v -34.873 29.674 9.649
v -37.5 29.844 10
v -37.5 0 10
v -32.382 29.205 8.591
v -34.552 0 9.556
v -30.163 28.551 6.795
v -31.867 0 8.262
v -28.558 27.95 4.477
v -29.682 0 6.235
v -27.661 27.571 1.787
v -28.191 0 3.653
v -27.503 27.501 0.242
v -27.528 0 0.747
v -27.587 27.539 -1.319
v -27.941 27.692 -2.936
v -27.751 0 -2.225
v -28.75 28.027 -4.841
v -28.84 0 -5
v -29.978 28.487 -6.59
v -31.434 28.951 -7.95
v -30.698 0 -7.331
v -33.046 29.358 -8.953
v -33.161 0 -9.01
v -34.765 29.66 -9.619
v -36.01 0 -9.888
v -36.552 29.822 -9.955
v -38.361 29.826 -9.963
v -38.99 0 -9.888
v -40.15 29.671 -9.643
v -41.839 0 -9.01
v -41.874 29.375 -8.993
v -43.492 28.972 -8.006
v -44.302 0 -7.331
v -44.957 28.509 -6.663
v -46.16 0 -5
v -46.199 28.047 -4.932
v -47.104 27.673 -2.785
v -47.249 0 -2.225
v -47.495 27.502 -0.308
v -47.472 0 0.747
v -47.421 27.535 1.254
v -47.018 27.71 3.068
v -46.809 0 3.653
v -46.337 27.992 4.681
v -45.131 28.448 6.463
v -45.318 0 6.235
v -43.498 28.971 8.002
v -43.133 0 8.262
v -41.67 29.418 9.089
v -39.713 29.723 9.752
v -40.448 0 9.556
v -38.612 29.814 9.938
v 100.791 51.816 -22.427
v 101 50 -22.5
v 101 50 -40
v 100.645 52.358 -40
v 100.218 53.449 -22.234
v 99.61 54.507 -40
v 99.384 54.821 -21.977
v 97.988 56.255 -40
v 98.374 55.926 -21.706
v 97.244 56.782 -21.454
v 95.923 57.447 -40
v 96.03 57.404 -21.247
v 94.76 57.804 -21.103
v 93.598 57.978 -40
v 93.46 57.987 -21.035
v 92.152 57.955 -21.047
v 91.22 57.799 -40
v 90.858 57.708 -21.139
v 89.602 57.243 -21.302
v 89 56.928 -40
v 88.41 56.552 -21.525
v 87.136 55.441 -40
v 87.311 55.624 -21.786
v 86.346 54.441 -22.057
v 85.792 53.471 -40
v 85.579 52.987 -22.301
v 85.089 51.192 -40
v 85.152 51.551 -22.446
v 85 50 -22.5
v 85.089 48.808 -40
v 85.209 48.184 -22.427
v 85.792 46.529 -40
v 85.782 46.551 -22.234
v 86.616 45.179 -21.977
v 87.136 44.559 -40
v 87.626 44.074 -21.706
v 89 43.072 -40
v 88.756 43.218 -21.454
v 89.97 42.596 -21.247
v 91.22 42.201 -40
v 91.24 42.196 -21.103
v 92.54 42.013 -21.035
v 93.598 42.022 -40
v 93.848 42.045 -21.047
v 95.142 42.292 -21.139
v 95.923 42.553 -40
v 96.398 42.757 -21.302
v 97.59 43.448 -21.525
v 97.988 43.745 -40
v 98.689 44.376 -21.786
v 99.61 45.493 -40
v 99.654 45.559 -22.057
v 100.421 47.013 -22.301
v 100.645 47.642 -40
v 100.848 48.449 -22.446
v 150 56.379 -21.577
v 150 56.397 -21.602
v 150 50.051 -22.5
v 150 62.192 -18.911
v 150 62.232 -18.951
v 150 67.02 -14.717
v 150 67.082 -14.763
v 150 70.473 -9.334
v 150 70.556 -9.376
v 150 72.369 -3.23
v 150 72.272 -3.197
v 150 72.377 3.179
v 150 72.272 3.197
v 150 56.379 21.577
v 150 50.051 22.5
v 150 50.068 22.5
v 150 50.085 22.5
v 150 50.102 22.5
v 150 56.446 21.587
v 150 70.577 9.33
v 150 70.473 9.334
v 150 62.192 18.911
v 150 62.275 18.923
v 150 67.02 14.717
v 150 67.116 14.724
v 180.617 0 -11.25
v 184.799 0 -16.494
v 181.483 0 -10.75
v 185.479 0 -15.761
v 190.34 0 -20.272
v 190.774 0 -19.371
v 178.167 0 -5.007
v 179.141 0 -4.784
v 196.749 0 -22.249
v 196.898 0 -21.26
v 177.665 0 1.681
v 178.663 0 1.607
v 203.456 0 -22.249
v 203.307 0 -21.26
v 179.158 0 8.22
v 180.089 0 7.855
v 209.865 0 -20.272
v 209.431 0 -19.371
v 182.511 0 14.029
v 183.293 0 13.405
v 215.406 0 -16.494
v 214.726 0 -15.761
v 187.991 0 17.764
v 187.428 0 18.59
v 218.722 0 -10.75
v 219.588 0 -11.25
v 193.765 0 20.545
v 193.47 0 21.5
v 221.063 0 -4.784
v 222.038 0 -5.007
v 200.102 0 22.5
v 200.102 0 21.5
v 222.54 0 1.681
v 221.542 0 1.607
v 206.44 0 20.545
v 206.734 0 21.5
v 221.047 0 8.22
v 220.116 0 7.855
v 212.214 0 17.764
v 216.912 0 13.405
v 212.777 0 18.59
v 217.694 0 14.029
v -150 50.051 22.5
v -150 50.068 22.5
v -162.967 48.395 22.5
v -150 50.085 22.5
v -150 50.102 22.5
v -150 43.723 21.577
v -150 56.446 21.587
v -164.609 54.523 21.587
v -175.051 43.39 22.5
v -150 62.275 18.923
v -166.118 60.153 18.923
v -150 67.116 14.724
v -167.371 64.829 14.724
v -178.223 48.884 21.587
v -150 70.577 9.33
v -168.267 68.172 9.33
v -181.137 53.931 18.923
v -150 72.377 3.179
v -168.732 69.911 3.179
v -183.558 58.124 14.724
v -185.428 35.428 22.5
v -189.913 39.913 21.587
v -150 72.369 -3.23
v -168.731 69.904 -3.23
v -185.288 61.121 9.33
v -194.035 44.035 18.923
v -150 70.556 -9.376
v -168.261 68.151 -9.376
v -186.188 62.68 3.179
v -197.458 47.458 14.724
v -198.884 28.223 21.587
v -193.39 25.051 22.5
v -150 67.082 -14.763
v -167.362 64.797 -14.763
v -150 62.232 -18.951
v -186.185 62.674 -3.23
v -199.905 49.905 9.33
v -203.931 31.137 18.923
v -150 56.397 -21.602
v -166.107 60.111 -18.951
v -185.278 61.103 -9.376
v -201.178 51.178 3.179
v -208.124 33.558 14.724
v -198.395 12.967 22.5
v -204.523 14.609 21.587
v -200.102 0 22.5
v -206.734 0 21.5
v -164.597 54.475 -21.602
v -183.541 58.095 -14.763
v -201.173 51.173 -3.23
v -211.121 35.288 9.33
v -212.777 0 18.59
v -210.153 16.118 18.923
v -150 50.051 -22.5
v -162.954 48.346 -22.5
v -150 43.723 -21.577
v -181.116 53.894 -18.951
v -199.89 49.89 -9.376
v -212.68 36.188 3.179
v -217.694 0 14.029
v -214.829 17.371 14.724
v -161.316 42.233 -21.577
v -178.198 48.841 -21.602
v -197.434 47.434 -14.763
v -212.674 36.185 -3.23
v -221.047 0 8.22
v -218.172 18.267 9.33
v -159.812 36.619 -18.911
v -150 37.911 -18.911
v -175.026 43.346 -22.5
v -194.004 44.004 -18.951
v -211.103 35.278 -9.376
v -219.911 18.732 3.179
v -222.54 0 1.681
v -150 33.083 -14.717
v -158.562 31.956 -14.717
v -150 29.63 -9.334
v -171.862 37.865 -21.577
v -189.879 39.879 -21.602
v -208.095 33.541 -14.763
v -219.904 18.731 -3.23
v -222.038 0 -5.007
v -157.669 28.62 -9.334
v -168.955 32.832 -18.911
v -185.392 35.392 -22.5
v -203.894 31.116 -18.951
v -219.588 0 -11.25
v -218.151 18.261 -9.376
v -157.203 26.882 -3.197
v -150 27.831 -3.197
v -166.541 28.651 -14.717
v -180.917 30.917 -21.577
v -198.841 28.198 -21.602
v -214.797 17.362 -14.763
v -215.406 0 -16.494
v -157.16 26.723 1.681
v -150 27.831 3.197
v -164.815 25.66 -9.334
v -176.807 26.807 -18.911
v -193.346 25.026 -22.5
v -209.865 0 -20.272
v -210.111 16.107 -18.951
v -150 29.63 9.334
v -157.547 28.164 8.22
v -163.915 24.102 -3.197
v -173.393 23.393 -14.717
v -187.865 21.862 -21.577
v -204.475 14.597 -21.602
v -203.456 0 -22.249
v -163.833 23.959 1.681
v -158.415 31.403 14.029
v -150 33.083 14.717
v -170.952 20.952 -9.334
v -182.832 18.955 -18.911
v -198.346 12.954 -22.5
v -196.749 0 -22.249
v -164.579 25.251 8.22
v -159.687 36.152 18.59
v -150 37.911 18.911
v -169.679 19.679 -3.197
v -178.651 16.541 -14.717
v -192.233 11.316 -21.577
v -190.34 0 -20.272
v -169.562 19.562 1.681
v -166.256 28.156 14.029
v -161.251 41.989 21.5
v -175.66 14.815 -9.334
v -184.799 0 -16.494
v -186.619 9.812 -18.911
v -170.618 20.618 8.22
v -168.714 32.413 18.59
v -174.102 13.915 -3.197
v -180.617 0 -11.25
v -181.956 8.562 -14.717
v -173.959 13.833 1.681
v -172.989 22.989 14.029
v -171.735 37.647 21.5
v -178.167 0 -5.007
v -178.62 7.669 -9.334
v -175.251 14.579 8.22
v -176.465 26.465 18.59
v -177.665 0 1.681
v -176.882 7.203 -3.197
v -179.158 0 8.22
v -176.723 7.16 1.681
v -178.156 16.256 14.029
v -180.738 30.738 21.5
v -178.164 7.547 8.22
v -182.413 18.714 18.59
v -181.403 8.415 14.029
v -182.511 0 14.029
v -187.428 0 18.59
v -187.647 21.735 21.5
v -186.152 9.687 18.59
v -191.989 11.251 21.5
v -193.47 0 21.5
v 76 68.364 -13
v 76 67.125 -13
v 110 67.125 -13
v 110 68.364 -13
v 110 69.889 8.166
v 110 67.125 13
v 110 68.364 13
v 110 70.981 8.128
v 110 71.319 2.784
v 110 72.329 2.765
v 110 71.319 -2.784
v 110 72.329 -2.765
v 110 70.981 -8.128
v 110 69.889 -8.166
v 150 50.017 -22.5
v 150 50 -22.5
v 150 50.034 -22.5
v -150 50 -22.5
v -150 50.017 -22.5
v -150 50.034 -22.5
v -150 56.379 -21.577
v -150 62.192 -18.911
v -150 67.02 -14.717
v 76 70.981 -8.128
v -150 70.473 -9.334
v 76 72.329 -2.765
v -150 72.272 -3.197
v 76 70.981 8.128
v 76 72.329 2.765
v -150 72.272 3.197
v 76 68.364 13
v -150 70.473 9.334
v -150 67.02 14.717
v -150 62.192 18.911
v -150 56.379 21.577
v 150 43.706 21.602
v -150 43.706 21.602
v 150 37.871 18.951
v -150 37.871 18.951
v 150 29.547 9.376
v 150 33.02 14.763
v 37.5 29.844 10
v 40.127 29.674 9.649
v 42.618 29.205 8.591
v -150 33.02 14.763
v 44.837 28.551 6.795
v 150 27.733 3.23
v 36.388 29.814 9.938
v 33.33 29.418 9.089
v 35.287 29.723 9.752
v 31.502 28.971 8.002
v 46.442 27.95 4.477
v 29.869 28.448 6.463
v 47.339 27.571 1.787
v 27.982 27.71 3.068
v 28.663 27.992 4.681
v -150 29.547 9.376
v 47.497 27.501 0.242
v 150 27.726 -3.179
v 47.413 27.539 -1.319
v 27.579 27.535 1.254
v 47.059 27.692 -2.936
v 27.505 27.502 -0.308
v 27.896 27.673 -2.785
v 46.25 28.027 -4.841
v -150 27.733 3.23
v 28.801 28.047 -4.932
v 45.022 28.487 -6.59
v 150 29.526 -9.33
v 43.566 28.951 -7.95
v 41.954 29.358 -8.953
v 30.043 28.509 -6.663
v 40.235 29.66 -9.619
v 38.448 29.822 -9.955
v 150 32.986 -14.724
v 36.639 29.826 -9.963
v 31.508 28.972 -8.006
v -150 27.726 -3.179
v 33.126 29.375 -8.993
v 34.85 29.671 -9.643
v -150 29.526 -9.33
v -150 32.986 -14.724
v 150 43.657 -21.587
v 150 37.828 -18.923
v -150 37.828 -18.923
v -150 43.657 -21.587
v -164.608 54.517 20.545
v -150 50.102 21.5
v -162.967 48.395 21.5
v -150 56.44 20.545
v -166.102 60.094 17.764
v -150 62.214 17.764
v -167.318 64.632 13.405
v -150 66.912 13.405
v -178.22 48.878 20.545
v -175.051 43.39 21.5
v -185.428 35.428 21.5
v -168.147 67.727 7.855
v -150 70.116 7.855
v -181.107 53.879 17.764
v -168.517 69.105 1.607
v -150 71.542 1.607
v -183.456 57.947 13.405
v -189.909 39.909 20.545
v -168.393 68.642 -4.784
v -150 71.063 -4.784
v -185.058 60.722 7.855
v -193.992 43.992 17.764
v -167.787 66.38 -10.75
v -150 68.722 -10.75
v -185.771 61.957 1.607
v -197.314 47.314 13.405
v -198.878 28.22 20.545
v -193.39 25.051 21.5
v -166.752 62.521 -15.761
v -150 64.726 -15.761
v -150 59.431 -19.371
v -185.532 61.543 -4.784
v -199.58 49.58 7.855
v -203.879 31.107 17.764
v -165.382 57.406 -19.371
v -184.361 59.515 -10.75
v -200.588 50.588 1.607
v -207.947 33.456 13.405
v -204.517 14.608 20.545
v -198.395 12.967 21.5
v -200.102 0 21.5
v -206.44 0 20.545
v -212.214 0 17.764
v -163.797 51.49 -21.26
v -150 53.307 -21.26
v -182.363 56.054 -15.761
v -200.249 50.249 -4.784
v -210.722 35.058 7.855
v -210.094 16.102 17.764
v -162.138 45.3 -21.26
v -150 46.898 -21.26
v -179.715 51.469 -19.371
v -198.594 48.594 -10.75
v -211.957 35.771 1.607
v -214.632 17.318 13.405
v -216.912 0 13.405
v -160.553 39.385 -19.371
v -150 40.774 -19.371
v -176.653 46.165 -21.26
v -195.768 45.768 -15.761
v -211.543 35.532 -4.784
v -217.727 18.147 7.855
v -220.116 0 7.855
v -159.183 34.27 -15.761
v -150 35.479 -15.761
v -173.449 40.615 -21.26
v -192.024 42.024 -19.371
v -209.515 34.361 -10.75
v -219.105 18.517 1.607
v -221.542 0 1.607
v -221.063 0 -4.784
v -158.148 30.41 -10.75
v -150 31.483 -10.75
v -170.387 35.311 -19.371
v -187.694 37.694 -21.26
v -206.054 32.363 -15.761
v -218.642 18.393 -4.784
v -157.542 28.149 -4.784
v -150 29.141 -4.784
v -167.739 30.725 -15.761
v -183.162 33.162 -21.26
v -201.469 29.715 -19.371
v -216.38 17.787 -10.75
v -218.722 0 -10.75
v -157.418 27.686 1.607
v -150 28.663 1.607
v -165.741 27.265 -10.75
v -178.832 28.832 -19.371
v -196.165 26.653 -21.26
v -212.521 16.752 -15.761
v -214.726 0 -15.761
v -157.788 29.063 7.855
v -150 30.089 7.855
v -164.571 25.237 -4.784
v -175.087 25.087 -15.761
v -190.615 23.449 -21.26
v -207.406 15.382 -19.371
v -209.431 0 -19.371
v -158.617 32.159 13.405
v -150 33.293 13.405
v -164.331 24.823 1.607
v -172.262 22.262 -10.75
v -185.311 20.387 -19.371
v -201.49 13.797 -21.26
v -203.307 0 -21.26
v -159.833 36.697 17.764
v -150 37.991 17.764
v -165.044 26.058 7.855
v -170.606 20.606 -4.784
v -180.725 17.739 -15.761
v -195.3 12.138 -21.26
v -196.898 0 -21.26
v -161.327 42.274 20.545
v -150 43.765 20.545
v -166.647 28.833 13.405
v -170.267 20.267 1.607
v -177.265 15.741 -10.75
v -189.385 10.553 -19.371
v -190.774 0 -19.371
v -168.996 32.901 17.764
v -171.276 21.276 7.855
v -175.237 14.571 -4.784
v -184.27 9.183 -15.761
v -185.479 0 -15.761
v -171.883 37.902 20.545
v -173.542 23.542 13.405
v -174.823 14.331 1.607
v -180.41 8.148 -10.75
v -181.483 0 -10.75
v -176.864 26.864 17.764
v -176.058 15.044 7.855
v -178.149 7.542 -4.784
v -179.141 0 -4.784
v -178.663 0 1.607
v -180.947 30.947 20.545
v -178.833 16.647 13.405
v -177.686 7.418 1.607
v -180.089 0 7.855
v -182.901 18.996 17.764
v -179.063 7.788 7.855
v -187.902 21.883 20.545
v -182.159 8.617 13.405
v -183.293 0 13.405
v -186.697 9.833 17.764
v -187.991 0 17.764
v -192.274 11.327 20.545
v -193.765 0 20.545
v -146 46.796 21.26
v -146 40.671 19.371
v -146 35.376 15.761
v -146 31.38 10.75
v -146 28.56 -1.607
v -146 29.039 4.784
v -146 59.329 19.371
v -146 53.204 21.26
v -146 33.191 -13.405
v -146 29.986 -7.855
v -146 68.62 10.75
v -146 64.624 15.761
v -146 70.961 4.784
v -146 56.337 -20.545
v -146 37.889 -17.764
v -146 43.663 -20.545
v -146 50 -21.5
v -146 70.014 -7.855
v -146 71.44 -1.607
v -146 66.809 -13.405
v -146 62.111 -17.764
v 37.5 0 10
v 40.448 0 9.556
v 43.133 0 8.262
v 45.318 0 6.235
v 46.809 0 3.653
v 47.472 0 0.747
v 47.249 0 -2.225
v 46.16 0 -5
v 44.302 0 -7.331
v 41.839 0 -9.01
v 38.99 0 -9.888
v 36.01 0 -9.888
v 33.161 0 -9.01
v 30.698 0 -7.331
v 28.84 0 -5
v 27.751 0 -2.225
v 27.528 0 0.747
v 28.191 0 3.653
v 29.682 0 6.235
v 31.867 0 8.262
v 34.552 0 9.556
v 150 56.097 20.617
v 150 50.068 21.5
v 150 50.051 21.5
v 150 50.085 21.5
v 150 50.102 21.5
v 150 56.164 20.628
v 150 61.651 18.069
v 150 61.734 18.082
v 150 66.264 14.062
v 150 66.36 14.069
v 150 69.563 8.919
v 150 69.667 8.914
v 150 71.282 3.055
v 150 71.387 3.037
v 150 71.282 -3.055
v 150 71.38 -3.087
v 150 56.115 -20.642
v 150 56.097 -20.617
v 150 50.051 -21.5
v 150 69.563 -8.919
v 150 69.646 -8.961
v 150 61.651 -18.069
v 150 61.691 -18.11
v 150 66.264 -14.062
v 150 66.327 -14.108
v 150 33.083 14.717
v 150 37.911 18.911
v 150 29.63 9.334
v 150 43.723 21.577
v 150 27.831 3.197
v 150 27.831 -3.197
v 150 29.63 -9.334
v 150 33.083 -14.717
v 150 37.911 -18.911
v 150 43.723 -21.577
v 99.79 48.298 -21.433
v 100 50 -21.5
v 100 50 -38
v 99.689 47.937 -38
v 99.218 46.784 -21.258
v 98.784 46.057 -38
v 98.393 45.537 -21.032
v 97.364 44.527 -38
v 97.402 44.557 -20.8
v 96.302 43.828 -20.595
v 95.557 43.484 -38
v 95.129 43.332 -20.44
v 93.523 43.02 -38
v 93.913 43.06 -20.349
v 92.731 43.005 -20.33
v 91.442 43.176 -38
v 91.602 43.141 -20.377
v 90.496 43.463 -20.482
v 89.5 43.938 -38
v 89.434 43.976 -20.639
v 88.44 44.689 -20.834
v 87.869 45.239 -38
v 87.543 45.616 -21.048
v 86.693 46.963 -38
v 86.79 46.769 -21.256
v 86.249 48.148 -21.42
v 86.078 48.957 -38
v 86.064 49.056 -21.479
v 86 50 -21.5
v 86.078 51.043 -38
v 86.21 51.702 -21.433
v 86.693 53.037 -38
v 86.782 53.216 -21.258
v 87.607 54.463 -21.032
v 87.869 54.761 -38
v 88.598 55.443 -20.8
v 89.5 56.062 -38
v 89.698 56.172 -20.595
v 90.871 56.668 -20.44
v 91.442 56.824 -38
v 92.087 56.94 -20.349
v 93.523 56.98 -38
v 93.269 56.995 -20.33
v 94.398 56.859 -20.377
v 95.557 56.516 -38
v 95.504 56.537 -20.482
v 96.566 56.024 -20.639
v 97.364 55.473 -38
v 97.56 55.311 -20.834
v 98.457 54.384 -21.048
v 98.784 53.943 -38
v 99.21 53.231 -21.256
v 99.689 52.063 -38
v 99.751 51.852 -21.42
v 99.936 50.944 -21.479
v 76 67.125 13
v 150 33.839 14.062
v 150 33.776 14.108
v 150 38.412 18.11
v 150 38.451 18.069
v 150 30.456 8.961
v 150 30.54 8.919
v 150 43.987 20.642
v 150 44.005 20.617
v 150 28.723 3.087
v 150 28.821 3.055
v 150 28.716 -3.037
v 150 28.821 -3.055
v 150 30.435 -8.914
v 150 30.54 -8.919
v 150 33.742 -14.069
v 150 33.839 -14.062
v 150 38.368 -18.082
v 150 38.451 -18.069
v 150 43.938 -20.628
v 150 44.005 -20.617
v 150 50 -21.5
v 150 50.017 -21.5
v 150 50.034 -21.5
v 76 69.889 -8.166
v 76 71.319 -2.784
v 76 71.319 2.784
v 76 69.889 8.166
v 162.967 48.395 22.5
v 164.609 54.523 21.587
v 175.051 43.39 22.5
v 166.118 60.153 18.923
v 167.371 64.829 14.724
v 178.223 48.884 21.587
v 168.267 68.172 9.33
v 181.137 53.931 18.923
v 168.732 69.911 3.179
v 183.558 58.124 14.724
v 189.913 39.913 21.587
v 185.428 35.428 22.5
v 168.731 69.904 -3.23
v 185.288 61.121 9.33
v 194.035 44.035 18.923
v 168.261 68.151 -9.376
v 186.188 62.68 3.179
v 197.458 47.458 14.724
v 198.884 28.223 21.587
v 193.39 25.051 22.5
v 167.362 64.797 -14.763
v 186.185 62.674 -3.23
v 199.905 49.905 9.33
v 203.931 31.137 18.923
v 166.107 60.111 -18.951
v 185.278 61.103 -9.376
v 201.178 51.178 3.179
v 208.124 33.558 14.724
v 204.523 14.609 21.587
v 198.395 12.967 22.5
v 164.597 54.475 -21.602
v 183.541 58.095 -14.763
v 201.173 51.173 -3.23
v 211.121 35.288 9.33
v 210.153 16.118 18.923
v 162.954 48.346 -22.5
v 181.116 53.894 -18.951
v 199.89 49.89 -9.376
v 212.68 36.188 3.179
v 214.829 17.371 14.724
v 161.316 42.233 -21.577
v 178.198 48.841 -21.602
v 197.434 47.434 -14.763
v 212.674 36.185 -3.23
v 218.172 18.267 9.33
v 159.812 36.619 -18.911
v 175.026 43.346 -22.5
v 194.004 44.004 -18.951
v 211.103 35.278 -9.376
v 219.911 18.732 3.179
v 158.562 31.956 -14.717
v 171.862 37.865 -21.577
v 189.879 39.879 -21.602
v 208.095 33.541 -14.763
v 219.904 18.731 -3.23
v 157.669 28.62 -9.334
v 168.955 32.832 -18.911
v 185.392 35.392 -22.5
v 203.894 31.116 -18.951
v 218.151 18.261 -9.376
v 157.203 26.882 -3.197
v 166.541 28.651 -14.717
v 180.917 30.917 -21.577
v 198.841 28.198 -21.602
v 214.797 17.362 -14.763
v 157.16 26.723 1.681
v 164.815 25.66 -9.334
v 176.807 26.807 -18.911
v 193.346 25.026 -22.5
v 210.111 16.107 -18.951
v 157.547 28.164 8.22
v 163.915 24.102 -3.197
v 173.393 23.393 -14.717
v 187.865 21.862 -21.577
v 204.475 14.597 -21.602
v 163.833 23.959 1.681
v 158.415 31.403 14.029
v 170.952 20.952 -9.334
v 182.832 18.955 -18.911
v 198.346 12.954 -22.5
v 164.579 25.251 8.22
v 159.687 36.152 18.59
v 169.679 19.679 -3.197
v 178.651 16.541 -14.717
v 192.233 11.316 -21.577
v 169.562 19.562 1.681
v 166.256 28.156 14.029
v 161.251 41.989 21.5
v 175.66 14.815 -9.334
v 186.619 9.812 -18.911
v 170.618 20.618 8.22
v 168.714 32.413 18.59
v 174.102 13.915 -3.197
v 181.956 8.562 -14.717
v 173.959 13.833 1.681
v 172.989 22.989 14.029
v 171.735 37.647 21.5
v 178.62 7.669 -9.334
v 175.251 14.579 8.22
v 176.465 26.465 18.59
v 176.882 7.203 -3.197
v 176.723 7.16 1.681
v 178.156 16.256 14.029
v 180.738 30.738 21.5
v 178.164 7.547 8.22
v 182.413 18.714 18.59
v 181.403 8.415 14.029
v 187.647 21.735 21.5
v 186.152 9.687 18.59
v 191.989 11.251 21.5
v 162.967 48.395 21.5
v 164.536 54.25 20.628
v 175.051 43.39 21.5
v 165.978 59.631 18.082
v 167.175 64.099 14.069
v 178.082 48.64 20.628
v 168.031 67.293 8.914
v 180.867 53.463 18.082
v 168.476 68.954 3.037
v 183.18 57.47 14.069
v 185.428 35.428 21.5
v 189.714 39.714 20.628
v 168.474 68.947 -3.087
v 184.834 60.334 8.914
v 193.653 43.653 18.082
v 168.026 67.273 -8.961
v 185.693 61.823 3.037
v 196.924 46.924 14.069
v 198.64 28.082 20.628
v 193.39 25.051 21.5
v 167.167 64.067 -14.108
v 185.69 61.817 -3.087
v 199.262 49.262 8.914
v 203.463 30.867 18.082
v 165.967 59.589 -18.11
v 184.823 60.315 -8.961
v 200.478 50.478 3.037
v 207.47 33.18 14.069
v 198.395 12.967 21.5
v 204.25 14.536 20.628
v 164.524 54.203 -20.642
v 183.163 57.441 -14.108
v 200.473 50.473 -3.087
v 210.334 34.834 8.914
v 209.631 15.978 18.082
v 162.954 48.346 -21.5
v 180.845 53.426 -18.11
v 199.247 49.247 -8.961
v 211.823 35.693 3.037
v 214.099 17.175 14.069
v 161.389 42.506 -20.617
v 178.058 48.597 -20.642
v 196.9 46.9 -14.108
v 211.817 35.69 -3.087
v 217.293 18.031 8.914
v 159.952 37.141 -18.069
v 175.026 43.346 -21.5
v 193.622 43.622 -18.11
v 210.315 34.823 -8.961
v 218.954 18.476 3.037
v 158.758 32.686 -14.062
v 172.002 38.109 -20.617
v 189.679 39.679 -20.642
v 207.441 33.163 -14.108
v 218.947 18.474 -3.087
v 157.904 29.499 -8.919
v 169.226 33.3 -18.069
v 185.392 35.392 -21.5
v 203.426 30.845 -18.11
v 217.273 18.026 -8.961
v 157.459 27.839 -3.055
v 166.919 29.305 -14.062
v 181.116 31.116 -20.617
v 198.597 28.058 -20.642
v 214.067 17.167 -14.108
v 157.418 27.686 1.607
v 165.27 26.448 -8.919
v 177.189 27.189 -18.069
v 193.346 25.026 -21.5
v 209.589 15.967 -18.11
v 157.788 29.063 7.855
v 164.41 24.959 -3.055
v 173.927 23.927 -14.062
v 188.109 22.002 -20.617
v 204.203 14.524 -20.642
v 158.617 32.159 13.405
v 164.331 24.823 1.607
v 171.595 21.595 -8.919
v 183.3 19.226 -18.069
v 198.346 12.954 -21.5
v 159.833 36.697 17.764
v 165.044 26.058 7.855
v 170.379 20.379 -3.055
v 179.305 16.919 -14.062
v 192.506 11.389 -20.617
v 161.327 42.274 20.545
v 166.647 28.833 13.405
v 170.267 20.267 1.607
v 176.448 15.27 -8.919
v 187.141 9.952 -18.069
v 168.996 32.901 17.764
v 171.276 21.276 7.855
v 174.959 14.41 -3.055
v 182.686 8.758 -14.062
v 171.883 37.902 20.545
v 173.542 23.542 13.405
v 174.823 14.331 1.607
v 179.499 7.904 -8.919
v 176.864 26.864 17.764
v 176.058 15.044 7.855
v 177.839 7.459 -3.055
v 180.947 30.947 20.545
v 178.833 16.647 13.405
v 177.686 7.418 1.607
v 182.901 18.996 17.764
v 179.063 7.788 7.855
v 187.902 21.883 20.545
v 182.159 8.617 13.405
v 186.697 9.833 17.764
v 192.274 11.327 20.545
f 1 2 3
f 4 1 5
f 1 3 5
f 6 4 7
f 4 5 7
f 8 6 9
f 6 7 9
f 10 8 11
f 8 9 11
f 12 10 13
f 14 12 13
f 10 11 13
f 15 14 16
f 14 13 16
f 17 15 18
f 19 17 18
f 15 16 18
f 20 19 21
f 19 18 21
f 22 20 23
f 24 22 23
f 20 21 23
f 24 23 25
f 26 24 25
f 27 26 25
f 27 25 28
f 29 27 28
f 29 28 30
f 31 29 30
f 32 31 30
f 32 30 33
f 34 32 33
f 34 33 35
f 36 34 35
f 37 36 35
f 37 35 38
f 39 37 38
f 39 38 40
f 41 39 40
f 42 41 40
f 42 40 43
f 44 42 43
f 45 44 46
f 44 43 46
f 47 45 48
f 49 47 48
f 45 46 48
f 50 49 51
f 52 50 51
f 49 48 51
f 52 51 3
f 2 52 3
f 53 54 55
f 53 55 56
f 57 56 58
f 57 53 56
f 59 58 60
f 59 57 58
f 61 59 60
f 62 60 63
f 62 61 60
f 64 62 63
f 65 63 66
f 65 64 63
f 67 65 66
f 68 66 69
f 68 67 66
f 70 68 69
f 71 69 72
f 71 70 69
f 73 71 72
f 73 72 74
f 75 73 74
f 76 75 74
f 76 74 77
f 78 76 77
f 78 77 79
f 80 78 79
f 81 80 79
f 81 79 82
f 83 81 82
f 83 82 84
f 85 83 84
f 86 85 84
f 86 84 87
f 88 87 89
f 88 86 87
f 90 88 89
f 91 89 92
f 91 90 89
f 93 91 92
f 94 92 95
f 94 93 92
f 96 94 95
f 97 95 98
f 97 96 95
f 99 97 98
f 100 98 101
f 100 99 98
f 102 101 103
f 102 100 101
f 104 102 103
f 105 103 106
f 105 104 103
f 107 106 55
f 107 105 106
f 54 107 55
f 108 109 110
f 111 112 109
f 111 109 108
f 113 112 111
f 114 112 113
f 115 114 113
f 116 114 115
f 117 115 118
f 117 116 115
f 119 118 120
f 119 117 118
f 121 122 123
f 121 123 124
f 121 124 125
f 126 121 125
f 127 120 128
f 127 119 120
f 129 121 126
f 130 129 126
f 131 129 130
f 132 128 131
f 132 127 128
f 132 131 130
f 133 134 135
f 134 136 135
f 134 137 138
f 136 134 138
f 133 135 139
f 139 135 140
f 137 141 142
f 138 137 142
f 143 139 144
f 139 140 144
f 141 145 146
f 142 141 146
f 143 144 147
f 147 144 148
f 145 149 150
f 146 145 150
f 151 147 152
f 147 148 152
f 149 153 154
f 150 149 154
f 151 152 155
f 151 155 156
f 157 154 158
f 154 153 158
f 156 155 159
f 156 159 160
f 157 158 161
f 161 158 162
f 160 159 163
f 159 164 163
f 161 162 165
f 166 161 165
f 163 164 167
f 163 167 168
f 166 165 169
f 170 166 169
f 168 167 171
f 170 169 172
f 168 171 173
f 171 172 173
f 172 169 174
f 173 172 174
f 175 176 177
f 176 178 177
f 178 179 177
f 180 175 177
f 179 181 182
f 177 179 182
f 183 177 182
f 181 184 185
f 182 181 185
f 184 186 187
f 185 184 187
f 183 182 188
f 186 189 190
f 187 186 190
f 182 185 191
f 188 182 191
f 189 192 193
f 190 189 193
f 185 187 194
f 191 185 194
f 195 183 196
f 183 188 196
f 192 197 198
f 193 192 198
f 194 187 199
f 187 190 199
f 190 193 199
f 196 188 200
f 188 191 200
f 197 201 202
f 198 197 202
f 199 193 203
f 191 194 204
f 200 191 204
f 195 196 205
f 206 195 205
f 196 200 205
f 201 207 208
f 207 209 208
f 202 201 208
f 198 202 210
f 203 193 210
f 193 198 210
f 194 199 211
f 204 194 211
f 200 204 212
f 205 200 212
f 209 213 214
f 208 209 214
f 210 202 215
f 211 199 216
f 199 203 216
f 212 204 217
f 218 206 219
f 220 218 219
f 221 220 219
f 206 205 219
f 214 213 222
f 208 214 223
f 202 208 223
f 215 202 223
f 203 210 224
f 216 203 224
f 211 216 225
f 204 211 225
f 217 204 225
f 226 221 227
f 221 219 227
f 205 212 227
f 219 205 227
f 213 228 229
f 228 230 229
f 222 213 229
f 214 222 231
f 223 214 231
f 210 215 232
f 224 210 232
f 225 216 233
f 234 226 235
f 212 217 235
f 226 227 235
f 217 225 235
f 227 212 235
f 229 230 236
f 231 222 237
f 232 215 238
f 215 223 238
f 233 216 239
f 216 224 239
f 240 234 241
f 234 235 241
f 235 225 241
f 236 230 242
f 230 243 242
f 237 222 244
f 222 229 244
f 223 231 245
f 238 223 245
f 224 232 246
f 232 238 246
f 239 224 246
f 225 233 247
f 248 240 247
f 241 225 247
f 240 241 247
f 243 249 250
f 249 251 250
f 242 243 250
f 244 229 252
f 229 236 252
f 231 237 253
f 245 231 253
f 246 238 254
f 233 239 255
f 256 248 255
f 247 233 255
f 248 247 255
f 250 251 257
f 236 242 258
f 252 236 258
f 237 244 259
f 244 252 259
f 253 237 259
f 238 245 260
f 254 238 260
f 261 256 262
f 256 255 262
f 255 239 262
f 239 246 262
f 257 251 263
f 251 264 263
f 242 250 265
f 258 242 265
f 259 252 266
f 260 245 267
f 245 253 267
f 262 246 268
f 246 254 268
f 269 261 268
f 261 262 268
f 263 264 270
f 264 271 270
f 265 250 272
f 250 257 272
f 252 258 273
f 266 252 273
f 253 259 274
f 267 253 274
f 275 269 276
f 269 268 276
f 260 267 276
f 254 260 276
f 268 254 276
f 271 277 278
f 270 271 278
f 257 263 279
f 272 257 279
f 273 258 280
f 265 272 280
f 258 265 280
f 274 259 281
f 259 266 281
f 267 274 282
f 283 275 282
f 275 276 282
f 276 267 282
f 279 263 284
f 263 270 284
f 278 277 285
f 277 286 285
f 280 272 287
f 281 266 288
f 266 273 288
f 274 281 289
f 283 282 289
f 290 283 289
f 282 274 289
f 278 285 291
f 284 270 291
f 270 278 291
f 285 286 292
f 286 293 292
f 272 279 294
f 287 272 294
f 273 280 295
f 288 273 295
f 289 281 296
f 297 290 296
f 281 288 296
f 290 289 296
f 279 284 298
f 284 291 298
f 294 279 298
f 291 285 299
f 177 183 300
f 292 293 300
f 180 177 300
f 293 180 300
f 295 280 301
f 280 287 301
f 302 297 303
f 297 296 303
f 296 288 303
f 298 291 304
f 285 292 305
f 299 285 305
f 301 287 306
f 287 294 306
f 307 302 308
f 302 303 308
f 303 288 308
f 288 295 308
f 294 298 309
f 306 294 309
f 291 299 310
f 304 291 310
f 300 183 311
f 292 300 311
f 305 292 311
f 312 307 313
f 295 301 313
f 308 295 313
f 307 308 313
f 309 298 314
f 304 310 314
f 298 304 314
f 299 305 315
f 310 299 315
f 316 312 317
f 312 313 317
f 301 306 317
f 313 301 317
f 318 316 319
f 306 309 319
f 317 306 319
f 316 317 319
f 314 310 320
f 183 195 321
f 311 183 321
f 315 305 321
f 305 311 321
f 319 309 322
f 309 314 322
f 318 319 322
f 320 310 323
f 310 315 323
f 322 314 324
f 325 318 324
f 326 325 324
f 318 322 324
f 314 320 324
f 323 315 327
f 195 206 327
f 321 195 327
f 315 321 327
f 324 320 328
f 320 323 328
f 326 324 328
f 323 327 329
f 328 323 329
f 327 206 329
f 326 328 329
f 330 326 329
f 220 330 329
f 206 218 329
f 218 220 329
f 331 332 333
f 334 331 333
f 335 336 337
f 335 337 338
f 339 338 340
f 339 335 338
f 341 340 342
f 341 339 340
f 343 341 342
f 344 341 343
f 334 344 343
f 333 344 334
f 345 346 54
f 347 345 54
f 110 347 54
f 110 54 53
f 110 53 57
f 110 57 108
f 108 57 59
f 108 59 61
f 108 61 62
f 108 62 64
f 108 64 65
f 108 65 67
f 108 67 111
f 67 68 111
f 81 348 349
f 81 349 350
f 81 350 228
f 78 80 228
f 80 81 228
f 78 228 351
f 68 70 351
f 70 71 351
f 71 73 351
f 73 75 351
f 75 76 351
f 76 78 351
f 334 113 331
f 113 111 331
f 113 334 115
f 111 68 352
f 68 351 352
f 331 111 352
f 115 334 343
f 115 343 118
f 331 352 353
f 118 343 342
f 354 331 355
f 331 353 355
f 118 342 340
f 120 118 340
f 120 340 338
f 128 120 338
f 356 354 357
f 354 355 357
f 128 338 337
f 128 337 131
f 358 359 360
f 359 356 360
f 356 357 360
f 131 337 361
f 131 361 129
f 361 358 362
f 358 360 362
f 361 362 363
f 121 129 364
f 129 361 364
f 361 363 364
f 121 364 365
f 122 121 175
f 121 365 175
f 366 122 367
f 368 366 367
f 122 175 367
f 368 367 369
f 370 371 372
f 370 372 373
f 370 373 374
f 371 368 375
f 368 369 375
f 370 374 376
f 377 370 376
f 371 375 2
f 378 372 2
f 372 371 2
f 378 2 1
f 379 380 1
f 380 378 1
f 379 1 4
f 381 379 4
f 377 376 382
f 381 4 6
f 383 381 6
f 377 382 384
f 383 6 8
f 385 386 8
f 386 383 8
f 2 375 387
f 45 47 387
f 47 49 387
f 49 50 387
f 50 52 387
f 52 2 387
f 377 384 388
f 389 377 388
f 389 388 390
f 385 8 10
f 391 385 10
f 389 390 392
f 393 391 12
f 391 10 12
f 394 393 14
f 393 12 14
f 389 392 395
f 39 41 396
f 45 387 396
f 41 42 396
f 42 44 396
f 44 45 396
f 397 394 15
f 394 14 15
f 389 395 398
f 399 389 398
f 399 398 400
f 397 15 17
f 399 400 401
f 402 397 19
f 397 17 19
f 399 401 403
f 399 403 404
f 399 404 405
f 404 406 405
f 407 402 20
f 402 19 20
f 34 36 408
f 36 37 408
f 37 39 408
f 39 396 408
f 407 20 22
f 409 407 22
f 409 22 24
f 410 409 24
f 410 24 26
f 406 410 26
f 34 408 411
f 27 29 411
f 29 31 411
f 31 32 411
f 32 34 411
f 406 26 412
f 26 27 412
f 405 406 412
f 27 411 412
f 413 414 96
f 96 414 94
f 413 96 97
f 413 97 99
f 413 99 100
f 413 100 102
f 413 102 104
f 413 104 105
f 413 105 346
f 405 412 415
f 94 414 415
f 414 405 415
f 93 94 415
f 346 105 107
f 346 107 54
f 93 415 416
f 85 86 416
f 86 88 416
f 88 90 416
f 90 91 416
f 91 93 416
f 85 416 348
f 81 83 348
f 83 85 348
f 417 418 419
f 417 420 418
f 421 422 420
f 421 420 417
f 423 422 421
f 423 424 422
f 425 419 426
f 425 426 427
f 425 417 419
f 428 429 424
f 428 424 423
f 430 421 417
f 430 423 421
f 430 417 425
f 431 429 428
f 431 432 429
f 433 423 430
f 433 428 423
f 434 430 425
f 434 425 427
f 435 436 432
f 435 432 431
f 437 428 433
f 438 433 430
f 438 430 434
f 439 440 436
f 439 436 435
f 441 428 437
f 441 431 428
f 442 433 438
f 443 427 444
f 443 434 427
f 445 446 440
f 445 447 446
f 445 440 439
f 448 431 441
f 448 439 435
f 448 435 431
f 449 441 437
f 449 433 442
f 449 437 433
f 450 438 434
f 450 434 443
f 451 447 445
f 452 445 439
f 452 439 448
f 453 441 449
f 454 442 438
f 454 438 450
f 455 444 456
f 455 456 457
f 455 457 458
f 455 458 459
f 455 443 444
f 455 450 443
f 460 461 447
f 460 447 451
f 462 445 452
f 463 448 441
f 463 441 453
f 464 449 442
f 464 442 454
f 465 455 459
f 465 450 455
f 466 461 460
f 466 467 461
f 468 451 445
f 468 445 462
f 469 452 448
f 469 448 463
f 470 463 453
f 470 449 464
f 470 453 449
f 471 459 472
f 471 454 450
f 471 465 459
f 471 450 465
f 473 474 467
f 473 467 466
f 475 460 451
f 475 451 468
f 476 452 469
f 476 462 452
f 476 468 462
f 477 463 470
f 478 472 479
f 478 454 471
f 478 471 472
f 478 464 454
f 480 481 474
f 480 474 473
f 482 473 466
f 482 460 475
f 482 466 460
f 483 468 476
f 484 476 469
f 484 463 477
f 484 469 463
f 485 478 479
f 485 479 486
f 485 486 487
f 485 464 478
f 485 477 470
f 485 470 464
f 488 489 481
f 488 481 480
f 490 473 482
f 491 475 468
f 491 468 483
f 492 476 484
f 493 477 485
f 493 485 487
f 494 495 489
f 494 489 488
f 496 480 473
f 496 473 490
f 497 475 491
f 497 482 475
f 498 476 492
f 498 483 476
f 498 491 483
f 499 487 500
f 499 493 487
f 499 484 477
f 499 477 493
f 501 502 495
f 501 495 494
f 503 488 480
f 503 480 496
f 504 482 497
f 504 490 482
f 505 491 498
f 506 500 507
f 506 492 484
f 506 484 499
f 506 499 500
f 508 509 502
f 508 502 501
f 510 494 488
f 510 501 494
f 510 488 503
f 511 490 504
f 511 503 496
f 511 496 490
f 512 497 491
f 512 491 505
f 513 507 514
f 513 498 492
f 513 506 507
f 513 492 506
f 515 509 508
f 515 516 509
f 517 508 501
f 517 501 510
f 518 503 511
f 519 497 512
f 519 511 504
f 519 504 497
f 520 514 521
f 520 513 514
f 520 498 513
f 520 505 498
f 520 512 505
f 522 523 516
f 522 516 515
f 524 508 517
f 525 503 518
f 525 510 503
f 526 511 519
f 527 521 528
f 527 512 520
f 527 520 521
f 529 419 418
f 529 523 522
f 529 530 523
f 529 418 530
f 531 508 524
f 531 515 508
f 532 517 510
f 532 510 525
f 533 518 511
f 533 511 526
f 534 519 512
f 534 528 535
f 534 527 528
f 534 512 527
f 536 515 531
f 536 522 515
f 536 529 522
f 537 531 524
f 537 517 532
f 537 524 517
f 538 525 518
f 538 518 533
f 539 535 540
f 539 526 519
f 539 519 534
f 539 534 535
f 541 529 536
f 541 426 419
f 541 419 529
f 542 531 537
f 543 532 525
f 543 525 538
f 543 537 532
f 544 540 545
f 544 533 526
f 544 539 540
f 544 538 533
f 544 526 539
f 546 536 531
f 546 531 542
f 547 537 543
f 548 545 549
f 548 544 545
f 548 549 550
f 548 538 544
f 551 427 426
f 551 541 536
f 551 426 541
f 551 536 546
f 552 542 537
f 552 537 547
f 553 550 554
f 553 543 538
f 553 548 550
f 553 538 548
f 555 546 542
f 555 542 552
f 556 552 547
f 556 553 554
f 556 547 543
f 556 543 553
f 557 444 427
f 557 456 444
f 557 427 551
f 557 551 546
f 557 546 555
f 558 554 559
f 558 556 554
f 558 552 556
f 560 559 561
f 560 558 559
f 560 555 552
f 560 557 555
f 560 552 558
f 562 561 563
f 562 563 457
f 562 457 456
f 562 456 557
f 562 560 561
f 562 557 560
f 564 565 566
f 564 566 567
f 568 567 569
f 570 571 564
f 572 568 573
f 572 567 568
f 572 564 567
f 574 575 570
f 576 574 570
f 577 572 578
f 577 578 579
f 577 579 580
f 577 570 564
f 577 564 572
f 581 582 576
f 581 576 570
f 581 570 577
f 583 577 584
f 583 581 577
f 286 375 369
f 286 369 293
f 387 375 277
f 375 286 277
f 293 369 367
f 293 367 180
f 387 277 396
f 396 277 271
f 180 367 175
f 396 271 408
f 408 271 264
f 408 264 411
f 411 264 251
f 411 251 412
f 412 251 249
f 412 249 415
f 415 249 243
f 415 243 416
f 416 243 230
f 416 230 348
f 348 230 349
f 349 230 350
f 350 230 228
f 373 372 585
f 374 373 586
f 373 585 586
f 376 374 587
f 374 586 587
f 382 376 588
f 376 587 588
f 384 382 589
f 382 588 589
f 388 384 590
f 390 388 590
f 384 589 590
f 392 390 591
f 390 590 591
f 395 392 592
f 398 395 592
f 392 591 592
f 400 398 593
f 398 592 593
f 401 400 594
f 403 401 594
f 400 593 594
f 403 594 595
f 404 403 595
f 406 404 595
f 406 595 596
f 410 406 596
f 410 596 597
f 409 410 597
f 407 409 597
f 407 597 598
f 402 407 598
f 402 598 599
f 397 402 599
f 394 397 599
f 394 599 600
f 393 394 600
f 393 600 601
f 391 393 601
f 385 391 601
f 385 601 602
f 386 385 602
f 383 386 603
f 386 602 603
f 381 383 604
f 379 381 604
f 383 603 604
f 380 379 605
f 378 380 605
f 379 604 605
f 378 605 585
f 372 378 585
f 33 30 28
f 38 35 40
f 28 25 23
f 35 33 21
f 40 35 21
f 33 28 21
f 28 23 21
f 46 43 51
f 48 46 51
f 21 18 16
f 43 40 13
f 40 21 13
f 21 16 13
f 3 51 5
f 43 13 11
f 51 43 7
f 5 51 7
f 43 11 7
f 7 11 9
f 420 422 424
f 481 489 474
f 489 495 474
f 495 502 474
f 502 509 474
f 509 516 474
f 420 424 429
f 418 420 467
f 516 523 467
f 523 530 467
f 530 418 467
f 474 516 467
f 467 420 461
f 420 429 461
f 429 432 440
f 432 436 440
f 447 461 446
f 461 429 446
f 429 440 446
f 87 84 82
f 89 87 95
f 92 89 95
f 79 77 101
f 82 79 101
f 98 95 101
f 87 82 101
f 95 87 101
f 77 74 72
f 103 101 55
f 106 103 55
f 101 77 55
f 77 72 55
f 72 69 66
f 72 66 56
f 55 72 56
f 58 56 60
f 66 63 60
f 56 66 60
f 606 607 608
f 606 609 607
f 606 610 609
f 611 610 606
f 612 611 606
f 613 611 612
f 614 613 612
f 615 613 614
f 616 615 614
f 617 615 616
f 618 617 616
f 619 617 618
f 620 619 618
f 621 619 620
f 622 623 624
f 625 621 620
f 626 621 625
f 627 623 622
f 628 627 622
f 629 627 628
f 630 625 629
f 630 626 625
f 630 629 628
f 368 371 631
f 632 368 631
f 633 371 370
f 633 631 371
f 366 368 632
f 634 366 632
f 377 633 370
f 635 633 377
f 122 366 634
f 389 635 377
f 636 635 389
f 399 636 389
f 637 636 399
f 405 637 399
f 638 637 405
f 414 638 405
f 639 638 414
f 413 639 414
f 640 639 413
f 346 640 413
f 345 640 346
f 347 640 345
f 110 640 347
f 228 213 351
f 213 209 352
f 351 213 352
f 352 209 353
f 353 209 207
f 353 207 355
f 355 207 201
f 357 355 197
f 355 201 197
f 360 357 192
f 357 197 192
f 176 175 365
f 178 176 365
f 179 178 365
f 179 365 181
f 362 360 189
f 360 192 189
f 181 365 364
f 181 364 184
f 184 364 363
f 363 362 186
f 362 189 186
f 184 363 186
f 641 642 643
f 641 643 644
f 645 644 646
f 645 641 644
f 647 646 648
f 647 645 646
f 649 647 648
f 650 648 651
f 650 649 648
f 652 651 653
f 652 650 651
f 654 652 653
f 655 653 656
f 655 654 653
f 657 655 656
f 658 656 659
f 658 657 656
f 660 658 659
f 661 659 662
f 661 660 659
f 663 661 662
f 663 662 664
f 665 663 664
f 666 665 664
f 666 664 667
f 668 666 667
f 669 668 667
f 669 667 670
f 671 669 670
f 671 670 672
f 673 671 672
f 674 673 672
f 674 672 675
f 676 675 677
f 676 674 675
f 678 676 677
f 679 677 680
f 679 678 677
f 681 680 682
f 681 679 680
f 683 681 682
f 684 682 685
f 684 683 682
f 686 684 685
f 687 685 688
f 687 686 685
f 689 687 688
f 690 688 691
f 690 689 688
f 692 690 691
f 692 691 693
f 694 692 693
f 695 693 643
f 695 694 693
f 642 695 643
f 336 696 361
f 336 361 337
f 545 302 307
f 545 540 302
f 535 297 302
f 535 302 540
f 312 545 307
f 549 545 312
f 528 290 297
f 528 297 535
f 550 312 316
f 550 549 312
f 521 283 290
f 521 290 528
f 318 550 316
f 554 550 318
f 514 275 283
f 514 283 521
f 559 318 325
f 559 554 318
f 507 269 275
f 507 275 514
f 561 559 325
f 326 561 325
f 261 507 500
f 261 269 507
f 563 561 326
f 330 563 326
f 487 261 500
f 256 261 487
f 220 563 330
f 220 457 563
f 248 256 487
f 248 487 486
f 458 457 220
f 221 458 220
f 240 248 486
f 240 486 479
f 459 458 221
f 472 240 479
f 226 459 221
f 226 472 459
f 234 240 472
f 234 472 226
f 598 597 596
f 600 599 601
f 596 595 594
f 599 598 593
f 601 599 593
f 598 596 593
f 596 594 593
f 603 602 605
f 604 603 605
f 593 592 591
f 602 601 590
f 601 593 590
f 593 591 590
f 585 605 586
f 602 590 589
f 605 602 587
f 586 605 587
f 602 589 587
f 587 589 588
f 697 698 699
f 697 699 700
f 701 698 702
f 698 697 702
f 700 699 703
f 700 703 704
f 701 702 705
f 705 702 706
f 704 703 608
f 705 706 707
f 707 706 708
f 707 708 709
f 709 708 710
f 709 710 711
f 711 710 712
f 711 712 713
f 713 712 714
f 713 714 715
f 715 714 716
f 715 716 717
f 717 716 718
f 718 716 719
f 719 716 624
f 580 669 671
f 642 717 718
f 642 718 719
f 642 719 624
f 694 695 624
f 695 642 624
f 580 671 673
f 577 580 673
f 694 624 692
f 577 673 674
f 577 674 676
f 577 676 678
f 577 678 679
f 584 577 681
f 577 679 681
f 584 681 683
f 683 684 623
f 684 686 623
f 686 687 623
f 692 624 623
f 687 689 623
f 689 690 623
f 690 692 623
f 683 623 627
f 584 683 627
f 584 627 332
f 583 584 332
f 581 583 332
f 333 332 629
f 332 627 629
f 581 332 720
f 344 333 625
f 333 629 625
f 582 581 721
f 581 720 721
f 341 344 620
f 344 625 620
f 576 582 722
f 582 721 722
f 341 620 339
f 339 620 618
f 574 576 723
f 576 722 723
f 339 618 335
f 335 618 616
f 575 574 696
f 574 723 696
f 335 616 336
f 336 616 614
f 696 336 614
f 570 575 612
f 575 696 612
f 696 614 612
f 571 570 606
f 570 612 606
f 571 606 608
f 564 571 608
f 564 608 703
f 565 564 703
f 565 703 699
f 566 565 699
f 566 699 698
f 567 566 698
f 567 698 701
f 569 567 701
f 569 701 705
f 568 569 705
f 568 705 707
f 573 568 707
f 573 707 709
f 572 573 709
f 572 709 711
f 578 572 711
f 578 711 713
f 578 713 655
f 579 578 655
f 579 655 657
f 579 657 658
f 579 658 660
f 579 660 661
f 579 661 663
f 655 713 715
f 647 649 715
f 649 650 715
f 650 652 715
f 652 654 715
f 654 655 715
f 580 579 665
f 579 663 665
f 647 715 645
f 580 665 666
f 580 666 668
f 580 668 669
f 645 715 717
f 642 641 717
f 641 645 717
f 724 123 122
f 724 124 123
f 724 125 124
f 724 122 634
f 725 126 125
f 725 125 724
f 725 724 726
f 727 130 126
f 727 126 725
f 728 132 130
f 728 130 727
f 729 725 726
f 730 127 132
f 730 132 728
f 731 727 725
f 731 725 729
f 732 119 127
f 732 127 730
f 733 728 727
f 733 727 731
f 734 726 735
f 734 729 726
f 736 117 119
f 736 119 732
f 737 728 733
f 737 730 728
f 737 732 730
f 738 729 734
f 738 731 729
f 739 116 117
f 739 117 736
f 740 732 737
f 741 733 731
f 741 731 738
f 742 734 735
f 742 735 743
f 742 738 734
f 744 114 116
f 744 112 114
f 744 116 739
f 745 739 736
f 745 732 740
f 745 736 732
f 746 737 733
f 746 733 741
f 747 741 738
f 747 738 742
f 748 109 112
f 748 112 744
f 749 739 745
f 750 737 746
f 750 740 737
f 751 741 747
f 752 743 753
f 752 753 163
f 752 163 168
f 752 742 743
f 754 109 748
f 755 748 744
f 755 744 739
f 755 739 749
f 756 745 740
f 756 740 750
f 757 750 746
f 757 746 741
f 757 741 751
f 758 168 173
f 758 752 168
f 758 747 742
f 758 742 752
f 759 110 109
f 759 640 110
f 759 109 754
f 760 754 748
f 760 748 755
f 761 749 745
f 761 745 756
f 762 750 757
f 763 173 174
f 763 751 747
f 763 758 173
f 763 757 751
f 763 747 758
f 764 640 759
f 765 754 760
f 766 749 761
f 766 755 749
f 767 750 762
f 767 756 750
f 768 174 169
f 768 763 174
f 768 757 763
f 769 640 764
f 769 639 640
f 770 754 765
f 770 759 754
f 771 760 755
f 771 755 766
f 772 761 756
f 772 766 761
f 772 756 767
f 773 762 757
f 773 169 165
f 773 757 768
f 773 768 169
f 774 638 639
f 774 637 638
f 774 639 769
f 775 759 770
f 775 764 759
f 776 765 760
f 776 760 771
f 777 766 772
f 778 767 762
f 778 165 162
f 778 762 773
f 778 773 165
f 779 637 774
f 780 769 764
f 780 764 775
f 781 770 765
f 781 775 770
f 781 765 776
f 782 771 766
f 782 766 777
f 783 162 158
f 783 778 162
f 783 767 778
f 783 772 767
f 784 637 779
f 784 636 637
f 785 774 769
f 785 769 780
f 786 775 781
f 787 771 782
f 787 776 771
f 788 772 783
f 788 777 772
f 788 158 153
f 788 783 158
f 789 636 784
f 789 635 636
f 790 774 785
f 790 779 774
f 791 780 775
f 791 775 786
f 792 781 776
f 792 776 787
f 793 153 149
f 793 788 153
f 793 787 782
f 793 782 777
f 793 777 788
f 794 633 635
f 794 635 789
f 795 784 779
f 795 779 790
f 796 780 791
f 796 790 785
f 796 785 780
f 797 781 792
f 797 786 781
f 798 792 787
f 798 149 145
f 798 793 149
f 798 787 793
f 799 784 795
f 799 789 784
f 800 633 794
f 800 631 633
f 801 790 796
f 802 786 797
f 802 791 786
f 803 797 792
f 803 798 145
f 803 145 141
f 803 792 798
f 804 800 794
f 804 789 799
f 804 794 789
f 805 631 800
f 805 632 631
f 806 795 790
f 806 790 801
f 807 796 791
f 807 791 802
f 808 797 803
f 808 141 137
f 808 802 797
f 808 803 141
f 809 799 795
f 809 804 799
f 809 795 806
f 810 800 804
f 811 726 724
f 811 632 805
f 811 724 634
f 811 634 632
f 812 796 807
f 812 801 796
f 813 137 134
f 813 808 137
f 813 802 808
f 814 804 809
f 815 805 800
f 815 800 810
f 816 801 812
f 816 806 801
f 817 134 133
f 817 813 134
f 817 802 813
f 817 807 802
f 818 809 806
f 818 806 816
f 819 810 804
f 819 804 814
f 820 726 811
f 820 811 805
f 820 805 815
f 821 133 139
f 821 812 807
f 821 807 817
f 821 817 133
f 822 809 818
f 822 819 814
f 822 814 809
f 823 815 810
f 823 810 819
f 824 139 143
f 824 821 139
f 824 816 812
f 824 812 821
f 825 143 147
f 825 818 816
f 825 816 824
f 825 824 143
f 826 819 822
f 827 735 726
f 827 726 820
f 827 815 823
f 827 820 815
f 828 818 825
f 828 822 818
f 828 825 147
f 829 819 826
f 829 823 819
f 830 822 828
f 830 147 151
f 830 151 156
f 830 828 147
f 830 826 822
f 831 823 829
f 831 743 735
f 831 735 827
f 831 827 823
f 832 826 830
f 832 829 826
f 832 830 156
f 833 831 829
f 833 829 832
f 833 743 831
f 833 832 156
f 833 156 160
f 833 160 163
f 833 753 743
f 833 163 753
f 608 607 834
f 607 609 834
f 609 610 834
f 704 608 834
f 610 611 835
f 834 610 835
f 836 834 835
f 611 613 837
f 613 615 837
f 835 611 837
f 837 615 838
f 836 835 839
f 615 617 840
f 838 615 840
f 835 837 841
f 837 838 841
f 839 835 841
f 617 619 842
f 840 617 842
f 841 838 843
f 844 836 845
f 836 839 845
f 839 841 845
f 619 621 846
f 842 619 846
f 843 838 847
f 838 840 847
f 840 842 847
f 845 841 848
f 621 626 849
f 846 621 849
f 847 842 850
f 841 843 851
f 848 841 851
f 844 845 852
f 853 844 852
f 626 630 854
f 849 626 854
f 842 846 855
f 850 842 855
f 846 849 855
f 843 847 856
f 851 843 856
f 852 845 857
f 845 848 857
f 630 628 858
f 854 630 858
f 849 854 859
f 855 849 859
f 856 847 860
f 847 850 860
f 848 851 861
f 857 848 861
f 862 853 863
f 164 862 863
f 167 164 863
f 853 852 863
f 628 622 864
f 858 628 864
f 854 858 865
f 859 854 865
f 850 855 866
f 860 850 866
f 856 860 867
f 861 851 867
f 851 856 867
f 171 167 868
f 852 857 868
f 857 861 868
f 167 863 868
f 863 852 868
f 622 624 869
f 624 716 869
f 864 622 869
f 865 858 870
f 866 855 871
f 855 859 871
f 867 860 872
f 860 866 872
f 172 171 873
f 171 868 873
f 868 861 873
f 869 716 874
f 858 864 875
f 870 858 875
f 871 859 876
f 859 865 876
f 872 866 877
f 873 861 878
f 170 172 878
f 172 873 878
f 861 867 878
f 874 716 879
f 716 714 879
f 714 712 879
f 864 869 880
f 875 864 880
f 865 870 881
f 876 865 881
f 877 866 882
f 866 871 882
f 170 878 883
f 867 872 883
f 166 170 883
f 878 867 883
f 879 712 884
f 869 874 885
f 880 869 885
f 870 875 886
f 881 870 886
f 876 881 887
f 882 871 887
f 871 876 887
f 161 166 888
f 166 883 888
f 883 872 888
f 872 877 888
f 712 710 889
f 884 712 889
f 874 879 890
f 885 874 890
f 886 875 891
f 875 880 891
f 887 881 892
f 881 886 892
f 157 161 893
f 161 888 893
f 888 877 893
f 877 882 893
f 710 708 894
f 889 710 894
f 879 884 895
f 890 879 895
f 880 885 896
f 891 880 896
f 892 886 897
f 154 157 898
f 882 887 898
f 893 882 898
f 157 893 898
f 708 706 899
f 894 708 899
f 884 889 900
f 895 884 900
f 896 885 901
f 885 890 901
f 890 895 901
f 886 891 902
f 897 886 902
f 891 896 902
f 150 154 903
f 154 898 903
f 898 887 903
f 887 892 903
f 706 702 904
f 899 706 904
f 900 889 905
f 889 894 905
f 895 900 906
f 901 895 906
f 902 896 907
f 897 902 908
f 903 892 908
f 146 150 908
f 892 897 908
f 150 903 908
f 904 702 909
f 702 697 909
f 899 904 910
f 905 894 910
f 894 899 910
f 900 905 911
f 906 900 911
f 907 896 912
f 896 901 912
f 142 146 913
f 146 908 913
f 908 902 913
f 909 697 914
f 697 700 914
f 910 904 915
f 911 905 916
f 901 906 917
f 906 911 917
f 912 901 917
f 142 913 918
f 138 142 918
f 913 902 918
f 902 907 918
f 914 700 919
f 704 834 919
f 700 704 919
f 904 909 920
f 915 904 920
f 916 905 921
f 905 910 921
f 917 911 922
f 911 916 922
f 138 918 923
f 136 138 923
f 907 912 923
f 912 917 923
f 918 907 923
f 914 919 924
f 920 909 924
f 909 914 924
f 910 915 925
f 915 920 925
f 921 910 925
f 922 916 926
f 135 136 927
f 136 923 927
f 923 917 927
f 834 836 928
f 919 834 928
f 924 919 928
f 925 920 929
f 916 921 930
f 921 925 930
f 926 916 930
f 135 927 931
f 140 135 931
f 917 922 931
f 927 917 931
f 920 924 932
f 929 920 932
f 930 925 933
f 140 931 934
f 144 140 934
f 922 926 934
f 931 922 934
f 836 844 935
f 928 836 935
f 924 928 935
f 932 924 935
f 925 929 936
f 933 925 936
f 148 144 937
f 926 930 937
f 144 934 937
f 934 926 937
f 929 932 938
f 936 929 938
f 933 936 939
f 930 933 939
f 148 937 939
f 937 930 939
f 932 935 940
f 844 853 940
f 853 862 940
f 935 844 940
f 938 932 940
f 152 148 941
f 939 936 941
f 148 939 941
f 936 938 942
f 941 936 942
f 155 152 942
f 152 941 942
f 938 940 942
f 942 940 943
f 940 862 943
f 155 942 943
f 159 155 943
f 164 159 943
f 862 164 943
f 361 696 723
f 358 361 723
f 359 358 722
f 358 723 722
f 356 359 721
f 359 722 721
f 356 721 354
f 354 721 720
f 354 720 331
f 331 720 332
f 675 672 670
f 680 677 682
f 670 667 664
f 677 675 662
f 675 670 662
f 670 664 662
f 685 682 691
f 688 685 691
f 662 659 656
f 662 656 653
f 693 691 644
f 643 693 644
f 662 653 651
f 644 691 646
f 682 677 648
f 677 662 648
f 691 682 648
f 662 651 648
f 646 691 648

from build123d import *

# Parameters (mm, degrees)
CROQUIS1_R                   = 10
SALIENTE_EXTRUIR1_DEPTH      = 40
SALIENTE_EXTRUIR1_2_DEPTH    = 40
SALIENTE_EXTRUIR2_DEPTH      = 150
SALIENTE_EXTRUIR2_DEPTH_BACK = 150
CROQUIS2_R                   = 22.5
CROQUIS6_R                   = 22.5
CROQUIS6_R_2                 = 21.5
REVOLUCI_N1_ANGLE            = 90
CORTAR_EXTRUIR2_START        = 60
CROQUIS7_W                   = 34
CROQUIS7_H                   = 26
CORTAR_EXTRUIR2_DEPTH        = 20
CROQUIS8_R                   = 8
SALIENTE_EXTRUIR3_DEPTH      = 40
CORTAR_EXTRUIR3_START        = -27
CROQUIS9_R                   = 7
CORTAR_EXTRUIR3_DEPTH        = 25
CROQUIS4_R                   = 21.5
CORTAR_EXTRUIR1_DEPTH        = 296


with BuildPart() as part:
    # Croquis1 → Saliente-Extruir1 (new body)
    with BuildSketch(Plane(origin=(0, 0, 0), x_dir=(1, 0, 0), z_dir=(0, 1, 0))):
        with Locations(Location((-37.5, 0, 0), (0, 0, 270))):
            Circle(CROQUIS1_R)
    extrude(amount=SALIENTE_EXTRUIR1_DEPTH)



with BuildPart() as body_2:
    # Croquis1 → Saliente-Extruir1 2 (new body)
    with BuildSketch(Plane(origin=(0, 0, 0), x_dir=(1, 0, 0), z_dir=(0, 1, 0))):
        with Locations(Location((37.5, 0, 0), (0, 0, 270))):
            Circle(CROQUIS1_R)
    extrude(amount=SALIENTE_EXTRUIR1_2_DEPTH)


with BuildPart() as part_1:
    add(part.part)

    add(body_2.part)  # Saliente-Extruir2 merges body 2
    # Croquis2 → Saliente-Extruir2 (add, two sides: drawn at the far end of the back side and taken through both)
    with BuildSketch(Plane(origin=(0, 0, 0), x_dir=(0, 0, -1), z_dir=(1, 0, 0)).offset(-SALIENTE_EXTRUIR2_DEPTH_BACK)):
        with Locations((0, 50)):
            Circle(CROQUIS2_R)
    extrude(amount=SALIENTE_EXTRUIR2_DEPTH + SALIENTE_EXTRUIR2_DEPTH_BACK)

    # Croquis6 → Revolución1 (revolve)
    with BuildSketch(Plane(origin=(150, 0, -150), x_dir=(0, 0, 1), z_dir=(-1, 0, 0))):
        with Locations((150, 50.102446163)):
            Circle(CROQUIS6_R)
        with Locations((150, 50.102446163)):
            Circle(CROQUIS6_R_2, mode=Mode.SUBTRACT)
    revoluci_n1 = revolve(axis=Axis((150, 0, 25.625), (0, 0, -1)), revolution_arc=REVOLUCI_N1_ANGLE)

    # Simetría1: Revolución1 across plane
    add(revoluci_n1.mirror(Plane(origin=(0, 0, 0), x_dir=(0, 0, 1), z_dir=(1, 0, 0))))

    # Croquis7 → Cortar-Extruir2 (cut)
    with BuildSketch(Plane(origin=(0, 0, 0), x_dir=(1, 0, 0), z_dir=(0, 1, 0)).offset(CORTAR_EXTRUIR2_START)):
        with Locations((93, 0)):
            Rectangle(CROQUIS7_W, CROQUIS7_H)
    extrude(amount=CORTAR_EXTRUIR2_DEPTH, mode=Mode.SUBTRACT)

    # Croquis8 → Saliente-Extruir3 (add)
    with BuildSketch(Plane.XY):
        with Locations((93, 50)):
            Circle(CROQUIS8_R)
    extrude(amount=-SALIENTE_EXTRUIR3_DEPTH)

    # Croquis9 → Cortar-Extruir3 (cut)
    with BuildSketch(Plane(origin=(0, 0, -40), x_dir=(-1, 0, 0), z_dir=(0, 0, -1)).offset(CORTAR_EXTRUIR3_START)):
        with Locations(Location((-93, 50, 0), (0, 0, 180))):
            Circle(CROQUIS9_R)
    extrude(amount=CORTAR_EXTRUIR3_DEPTH, mode=Mode.SUBTRACT)

    # Croquis4 → Cortar-Extruir1 (cut)
    with BuildSketch(Plane(origin=(150, 0, 0), x_dir=(0, 0, -1), z_dir=(1, 0, 0))):
        with Locations((0, 50)):
            Circle(CROQUIS4_R)
    extrude(amount=-CORTAR_EXTRUIR1_DEPTH, mode=Mode.SUBTRACT)


solid = part_1.part
